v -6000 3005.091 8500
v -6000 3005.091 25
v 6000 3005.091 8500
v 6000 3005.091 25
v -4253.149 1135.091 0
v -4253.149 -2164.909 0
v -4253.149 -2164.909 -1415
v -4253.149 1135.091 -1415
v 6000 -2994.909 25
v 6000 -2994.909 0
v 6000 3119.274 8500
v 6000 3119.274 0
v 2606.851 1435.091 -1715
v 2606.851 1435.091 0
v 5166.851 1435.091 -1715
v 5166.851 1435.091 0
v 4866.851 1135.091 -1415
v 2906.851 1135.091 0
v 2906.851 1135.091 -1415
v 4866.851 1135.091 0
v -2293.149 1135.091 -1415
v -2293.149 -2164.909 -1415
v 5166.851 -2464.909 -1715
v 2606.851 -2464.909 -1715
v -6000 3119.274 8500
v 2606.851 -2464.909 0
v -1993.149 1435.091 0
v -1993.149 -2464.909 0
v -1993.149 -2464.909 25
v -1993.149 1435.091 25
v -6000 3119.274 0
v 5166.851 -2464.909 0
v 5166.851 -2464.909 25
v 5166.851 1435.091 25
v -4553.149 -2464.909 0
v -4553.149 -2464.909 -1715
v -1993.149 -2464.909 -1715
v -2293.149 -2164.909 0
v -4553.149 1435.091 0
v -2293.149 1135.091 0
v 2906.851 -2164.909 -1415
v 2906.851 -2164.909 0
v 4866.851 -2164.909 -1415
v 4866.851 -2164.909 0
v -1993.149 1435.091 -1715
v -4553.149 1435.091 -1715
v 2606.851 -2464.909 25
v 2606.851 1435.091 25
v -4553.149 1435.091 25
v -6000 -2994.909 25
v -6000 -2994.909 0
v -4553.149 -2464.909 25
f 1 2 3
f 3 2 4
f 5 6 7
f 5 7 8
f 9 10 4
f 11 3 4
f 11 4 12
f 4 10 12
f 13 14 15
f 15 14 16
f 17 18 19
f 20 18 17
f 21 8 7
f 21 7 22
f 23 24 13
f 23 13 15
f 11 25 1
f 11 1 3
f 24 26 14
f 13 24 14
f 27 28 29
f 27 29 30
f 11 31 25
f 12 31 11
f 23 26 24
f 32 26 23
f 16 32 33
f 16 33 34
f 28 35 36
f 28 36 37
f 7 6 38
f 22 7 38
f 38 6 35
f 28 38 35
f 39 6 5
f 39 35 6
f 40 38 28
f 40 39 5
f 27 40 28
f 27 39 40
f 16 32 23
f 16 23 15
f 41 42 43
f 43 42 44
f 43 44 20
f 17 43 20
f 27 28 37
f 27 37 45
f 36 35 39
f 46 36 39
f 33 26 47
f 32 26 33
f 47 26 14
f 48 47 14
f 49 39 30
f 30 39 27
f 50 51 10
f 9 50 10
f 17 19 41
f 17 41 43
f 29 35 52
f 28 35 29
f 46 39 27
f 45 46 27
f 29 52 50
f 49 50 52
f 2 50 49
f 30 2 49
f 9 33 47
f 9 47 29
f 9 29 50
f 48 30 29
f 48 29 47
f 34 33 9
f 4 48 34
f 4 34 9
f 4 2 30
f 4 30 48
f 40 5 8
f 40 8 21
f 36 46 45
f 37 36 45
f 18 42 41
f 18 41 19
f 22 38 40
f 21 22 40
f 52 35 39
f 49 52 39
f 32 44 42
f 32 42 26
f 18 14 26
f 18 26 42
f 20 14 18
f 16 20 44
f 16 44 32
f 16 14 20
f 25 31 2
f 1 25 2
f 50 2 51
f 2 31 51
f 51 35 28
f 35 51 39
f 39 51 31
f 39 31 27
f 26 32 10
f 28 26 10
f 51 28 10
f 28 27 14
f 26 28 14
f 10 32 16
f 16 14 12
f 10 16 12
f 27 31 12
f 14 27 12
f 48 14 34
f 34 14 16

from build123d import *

# Parameters (mm, degrees)
F0_W     = 12000
F0_H     = 114.1832326539
F1_DEPTH = 8500
F0_H_2   = 6000
F0_W_2   = 2560
F0_H_3   = 3900
F2_DEPTH = 25
F0_W_3   = 1960
F0_H_4   = 3300
F3_DEPTH = 1715
F4_T     = -300
F4_2_T   = -300


with BuildPart() as f1:
    # F0 (on Top) → F1 (new body)
    with BuildSketch(Plane.XY):
        with Locations((0, 3062.1825230774)):
            Rectangle(F0_W, F0_H)
    extrude(amount=F1_DEPTH)

    # F0 (on Top) → F2 (join)
    with BuildSketch(Plane.XY):
        with Locations((0, 5.0909067504)):
            Rectangle(F0_W, F0_H_2)
        with Locations((-3273.1487464905, -514.9090932496)):
            Rectangle(F0_W_2, F0_H_3, mode=Mode.SUBTRACT)
        with Locations((3886.8512535095, -514.9090932496)):
            Rectangle(F0_W_2, F0_H_3, mode=Mode.SUBTRACT)
        with Locations((0, 3062.1825230774)):
            Rectangle(F0_W, F0_H)
    extrude(amount=F2_DEPTH)


with BuildPart() as f3:
    # F0 (on Top) → F3 (new body)
    with BuildSketch(Plane.XY):
        with Locations((-3273.1487464905, -514.9090932496)):
            Rectangle(F0_W_2, F0_H_3)
        with Locations((-3273.1487464905, -514.9090932496)):
            Rectangle(F0_W_3, F0_H_4, mode=Mode.SUBTRACT)
        with Locations((-3273.1487464905, -514.9090932496)):
            Rectangle(F0_W_3, F0_H_4)
    extrude(amount=-F3_DEPTH)

    # F4
    f4_openings = [f3.faces().sort_by_distance(p)[0] for p in [
        (-3273.148746, -514.909093, 0),
    ]]
    offset(amount=F4_T, openings=f4_openings)


with BuildPart() as f3b:
    # F0 (on Top) → F3, piece 2 (new body)
    with BuildSketch(Plane.XY):
        with Locations((3886.8512535095, -514.9090932496)):
            Rectangle(F0_W_2, F0_H_3)
        with Locations((3886.8512535095, -514.9090932496)):
            Rectangle(F0_W_3, F0_H_4, mode=Mode.SUBTRACT)
        with Locations((3886.8512535095, -514.9090932496)):
            Rectangle(F0_W_3, F0_H_4)
    extrude(amount=-F3_DEPTH)

    # F4#2
    f4_2_openings = [f3b.faces().sort_by_distance(p)[0] for p in [
        (3886.851254, -514.909093, 0),
    ]]
    offset(amount=F4_2_T, openings=f4_2_openings)


solid = Compound([f1.part, f3.part, f3b.part])
